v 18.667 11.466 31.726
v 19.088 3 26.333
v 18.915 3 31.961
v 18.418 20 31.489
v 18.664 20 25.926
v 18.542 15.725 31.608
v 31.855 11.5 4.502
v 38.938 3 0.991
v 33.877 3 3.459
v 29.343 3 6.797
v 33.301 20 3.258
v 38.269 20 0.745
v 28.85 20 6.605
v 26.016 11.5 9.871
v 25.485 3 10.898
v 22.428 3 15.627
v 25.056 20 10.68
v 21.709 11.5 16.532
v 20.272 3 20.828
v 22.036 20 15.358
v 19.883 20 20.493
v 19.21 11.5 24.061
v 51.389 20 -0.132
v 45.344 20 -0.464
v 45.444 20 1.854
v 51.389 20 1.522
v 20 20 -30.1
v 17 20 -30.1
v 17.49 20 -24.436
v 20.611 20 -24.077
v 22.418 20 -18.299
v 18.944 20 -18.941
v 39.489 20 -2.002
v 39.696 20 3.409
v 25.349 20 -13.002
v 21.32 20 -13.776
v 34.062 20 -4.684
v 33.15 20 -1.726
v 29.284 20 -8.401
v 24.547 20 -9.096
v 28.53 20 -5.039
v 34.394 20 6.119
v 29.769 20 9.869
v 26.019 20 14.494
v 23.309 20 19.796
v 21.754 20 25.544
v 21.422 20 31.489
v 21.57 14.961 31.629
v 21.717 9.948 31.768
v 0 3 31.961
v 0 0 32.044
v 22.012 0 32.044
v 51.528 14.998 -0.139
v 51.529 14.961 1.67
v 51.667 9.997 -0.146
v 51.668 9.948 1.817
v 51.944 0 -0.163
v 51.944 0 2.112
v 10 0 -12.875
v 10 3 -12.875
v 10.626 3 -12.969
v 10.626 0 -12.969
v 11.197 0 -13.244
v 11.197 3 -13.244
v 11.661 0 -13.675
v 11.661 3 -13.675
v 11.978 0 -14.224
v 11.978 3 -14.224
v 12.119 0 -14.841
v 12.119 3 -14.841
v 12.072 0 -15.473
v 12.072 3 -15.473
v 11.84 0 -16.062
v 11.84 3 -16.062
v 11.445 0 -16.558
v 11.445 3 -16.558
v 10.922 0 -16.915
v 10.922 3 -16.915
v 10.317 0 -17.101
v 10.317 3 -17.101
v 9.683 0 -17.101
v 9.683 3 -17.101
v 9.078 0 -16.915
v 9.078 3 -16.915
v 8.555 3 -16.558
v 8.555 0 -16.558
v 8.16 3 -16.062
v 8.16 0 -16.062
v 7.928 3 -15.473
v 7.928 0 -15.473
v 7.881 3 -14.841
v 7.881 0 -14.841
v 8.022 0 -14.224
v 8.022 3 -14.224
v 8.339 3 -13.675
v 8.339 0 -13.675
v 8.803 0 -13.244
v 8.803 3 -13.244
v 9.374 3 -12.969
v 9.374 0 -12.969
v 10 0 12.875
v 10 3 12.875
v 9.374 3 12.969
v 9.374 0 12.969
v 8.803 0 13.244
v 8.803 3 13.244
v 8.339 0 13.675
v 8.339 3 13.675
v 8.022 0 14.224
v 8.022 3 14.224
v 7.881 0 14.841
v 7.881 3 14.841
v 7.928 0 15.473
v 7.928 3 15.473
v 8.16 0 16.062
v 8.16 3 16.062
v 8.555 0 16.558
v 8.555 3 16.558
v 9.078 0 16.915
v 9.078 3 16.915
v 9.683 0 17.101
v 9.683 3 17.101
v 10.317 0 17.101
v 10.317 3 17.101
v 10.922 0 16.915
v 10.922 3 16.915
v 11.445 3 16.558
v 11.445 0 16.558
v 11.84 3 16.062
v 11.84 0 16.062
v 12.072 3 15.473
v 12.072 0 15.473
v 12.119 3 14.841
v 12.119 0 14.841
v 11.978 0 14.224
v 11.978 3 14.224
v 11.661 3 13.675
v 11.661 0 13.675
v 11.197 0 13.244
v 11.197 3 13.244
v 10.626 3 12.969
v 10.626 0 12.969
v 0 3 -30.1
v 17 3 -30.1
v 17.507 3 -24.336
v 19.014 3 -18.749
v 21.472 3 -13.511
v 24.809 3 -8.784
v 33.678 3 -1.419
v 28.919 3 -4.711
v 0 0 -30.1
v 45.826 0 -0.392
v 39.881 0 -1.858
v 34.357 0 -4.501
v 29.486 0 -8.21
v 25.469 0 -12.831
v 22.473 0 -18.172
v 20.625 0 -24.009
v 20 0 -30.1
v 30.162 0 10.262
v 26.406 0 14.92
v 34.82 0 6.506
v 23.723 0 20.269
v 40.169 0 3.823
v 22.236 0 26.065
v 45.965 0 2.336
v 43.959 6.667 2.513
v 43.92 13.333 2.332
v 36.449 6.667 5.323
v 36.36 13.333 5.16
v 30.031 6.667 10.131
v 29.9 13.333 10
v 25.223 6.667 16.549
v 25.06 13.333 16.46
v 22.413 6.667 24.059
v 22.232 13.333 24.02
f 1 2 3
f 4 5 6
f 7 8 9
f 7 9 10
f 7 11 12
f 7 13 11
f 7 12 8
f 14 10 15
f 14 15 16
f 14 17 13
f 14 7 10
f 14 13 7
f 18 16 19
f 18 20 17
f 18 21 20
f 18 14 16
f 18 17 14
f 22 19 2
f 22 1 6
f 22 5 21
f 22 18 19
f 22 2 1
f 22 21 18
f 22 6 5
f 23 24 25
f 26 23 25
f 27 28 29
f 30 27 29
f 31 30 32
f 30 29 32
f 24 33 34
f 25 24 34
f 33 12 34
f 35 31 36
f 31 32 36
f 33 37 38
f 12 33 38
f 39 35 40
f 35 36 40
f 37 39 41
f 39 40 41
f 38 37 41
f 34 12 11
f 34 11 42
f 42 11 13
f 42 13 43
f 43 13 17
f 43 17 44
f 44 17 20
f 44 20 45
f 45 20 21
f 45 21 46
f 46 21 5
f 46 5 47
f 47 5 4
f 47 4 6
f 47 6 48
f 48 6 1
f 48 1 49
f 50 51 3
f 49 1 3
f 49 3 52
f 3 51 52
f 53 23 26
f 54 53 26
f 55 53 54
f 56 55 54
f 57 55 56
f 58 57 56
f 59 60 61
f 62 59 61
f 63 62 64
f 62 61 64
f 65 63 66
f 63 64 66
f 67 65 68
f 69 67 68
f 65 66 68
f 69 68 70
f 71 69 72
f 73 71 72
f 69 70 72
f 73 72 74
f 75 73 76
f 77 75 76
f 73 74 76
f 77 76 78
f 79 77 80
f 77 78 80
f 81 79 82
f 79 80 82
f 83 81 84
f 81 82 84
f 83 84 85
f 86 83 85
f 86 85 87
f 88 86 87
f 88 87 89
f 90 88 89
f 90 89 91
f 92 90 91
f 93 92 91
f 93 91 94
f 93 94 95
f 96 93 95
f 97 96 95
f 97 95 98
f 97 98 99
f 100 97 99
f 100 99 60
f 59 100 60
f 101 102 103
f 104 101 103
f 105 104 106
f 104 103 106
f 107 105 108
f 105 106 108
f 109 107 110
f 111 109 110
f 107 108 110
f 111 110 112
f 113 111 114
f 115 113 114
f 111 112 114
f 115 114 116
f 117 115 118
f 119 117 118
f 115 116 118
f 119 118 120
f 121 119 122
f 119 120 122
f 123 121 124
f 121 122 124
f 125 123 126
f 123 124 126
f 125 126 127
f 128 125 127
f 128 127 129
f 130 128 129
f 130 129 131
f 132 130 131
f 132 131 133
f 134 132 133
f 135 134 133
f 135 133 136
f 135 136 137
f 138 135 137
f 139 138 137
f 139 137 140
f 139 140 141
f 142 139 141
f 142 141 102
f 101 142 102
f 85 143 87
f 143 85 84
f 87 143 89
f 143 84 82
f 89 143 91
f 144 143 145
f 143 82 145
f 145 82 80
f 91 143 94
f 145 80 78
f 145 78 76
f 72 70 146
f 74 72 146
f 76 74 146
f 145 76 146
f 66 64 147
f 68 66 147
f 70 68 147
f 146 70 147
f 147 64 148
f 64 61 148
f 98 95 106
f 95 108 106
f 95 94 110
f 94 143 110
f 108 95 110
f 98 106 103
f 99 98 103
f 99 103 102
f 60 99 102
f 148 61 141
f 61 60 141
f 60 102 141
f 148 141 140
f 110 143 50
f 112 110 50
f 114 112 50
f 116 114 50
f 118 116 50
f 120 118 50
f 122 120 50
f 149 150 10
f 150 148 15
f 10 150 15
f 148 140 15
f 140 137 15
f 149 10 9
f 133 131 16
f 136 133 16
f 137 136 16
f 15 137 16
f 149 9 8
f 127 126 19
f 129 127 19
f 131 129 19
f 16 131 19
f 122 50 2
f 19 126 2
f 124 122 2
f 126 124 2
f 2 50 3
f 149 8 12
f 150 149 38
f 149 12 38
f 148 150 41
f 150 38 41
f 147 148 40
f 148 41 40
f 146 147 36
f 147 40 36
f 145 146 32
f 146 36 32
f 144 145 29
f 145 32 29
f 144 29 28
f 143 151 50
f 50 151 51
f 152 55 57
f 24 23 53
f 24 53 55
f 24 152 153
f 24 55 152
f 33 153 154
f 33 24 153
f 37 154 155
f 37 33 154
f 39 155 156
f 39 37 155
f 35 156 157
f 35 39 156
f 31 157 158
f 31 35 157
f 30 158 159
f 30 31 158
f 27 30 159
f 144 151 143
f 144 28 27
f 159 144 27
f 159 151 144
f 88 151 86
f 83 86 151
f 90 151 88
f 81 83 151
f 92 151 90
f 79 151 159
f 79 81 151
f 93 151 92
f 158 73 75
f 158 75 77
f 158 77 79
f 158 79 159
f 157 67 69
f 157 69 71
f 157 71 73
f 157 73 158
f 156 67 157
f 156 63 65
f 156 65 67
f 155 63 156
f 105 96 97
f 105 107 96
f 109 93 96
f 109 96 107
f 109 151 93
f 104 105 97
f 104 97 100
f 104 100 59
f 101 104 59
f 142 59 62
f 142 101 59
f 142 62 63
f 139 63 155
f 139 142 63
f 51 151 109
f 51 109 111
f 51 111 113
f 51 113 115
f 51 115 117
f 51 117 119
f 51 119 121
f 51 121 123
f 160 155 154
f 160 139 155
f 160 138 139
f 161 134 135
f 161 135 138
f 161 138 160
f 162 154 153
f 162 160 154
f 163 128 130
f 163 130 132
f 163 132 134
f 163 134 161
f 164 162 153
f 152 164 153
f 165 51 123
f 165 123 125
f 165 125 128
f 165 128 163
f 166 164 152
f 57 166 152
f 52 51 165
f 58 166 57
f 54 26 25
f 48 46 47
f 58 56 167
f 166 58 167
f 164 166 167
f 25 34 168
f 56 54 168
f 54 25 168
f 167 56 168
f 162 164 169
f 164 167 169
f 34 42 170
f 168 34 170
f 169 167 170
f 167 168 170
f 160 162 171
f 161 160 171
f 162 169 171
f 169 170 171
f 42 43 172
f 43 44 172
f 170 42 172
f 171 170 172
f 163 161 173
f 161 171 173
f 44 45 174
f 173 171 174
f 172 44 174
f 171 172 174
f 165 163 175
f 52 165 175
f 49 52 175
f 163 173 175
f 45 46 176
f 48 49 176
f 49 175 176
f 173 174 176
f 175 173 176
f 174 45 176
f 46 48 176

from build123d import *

# Parameters (mm, degrees)
SKETCH_1_W          = 50
SKETCH_1_H          = 30.1
EXTRUDE_1_DEPTH     = 70
CUT_EXTRUDE_2_DEPTH = 70
DRAFT_4_ANGLE       = 1.591
SKETCH_4_W          = 61.588766385
SKETCH_4_H          = 50
CUT_EXTRUDE_3_DEPTH = 93.871109174
SHELL_2_T           = -3
SKETCH_5_R          = 2.125
CUT_EXTRUDE_4_DEPTH = 64.356474986


with BuildPart() as part:
    # 草圖1 → 填料-伸長1 (new body)
    with BuildSketch(Plane(origin=(0, 0, 0), x_dir=(1, 0, 0), z_dir=(0, 1, 0))):
        with Locations((25, 15.05)):
            Rectangle(SKETCH_1_W, SKETCH_1_H)
    extrude_1 = extrude(amount=EXTRUDE_1_DEPTH)

    # 草圖3 → 除料-伸長2 (cut)
    with BuildSketch(Plane(origin=(0, 70, 0), x_dir=(1, 0, 0), z_dir=(0, 1, 0))):
        with BuildLine():
            Line((20, 30.1), (50, 30.1))
            Line((50, 30.1), (50, 0.1))
            ThreePointArc((50, 0.1), (28.786796564, 8.886796564), (20, 30.1))
        make_face()
    cut_extrude_2 = extrude(amount=-CUT_EXTRUDE_2_DEPTH, mode=Mode.SUBTRACT)

    # 鏡射1: 填料-伸長1, 除料-伸長2 across plane
    add(extrude_1.mirror(Plane.XY))
    add(cut_extrude_2.mirror(Plane.XY), mode=Mode.SUBTRACT)

    # 拔模4
    draft_4_faces = [part.faces().sort_by_distance(p)[0] for p in [
        (50, 35, 0),
        (10, 35, 30.1),
        (28.786796564, 35, 8.886796564),
    ]]
    draft(draft_4_faces, Plane.ZX.offset(70), DRAFT_4_ANGLE)

    # 草圖4 → 除料-伸長3 (cut, through all)
    with BuildSketch(Plane.ZY):
        with Locations((0.694383193, 45)):
            Rectangle(SKETCH_4_W, SKETCH_4_H)
    extrude(amount=-CUT_EXTRUDE_3_DEPTH, mode=Mode.SUBTRACT)

    # 薄殼2
    shell_2_openings = [part.faces().sort_by_distance(p)[0] for p in [
        (10.858708279, 9.954778556, 31.767775702),
        (14.773415442, 20, 0.973960422),
        (10, 10, -30.1),
        (0, 9.985034809, 0.833467662),
    ]]
    offset(amount=SHELL_2_T, openings=shell_2_openings, kind=Kind.INTERSECTION)

    # 草圖5 → 除料-伸長4 (cut, through all)
    with BuildSketch(Plane(origin=(0, 3, 0), x_dir=(1, 0, 0), z_dir=(0, 1, 0))):
        with Locations(Location((10, 15, 0), (0, 0, 270))):
            Circle(SKETCH_5_R)
        with Locations(Location((10, -15, 0), (0, 0, 90))):
            Circle(SKETCH_5_R)
    extrude(amount=-CUT_EXTRUDE_4_DEPTH, mode=Mode.SUBTRACT)


solid = part.part
